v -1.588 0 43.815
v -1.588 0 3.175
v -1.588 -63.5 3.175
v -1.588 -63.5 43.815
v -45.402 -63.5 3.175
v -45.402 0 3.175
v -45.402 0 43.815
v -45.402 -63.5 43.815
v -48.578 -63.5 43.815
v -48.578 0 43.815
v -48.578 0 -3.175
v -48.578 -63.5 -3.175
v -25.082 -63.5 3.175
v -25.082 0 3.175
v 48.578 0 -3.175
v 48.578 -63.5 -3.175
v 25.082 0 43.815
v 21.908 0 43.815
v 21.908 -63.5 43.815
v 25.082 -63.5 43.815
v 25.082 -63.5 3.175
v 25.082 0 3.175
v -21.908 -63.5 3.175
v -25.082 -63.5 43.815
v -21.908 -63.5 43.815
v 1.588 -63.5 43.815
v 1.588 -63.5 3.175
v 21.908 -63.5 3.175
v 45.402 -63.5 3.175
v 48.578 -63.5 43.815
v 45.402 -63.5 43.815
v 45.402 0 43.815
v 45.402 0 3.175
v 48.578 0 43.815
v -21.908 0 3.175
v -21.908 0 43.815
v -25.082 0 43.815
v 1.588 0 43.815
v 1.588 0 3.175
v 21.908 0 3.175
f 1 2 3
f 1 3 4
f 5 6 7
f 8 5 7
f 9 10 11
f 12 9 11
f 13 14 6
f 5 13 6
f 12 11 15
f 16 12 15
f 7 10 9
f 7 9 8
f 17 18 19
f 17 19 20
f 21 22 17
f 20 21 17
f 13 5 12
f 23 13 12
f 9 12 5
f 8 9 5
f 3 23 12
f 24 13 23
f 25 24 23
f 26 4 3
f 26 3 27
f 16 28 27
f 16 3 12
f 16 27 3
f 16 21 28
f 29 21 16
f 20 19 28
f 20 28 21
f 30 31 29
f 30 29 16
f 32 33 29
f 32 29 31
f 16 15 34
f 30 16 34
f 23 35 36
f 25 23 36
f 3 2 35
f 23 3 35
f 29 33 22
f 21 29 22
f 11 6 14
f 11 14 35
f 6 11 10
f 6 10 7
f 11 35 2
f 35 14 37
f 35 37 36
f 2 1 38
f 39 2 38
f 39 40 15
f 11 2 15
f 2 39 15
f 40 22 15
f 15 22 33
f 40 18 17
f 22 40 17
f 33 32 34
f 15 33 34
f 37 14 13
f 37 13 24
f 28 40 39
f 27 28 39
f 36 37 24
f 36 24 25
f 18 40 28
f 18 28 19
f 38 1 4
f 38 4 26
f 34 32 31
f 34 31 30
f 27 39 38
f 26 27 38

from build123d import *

# Parameters (mm, degrees)
F0_W     = 3.175
F0_H     = 40.64
F1_DEPTH = 63.5


with BuildPart() as f1:
    # F0 (on Front) → F1 (new body)
    with BuildSketch(Plane.XZ):
        Polygon((48.5775, -3.175), (48.5775, 3.175), (45.4025, 3.175), (25.0825, 3.175), (21.9075, 3.175), (1.5875, 3.175), (-1.5875, 3.175), (-21.9075, 3.175), (-25.0825, 3.175), (-45.4025, 3.175), (-48.5775, 3.175), (-48.5775, -3.175), align=None)
        with Locations((46.99, 23.495)):
            Rectangle(F0_W, F0_H)
        with Locations((23.495, 23.495)):
            Rectangle(F0_W, F0_H)
        with Locations((-46.99, 23.495)):
            Rectangle(F0_W, F0_H)
        with Locations((0, 23.495)):
            Rectangle(F0_W, F0_H)
        with Locations((-23.495, 23.495)):
            Rectangle(F0_W, F0_H)
    extrude(amount=F1_DEPTH)


solid = f1.part
